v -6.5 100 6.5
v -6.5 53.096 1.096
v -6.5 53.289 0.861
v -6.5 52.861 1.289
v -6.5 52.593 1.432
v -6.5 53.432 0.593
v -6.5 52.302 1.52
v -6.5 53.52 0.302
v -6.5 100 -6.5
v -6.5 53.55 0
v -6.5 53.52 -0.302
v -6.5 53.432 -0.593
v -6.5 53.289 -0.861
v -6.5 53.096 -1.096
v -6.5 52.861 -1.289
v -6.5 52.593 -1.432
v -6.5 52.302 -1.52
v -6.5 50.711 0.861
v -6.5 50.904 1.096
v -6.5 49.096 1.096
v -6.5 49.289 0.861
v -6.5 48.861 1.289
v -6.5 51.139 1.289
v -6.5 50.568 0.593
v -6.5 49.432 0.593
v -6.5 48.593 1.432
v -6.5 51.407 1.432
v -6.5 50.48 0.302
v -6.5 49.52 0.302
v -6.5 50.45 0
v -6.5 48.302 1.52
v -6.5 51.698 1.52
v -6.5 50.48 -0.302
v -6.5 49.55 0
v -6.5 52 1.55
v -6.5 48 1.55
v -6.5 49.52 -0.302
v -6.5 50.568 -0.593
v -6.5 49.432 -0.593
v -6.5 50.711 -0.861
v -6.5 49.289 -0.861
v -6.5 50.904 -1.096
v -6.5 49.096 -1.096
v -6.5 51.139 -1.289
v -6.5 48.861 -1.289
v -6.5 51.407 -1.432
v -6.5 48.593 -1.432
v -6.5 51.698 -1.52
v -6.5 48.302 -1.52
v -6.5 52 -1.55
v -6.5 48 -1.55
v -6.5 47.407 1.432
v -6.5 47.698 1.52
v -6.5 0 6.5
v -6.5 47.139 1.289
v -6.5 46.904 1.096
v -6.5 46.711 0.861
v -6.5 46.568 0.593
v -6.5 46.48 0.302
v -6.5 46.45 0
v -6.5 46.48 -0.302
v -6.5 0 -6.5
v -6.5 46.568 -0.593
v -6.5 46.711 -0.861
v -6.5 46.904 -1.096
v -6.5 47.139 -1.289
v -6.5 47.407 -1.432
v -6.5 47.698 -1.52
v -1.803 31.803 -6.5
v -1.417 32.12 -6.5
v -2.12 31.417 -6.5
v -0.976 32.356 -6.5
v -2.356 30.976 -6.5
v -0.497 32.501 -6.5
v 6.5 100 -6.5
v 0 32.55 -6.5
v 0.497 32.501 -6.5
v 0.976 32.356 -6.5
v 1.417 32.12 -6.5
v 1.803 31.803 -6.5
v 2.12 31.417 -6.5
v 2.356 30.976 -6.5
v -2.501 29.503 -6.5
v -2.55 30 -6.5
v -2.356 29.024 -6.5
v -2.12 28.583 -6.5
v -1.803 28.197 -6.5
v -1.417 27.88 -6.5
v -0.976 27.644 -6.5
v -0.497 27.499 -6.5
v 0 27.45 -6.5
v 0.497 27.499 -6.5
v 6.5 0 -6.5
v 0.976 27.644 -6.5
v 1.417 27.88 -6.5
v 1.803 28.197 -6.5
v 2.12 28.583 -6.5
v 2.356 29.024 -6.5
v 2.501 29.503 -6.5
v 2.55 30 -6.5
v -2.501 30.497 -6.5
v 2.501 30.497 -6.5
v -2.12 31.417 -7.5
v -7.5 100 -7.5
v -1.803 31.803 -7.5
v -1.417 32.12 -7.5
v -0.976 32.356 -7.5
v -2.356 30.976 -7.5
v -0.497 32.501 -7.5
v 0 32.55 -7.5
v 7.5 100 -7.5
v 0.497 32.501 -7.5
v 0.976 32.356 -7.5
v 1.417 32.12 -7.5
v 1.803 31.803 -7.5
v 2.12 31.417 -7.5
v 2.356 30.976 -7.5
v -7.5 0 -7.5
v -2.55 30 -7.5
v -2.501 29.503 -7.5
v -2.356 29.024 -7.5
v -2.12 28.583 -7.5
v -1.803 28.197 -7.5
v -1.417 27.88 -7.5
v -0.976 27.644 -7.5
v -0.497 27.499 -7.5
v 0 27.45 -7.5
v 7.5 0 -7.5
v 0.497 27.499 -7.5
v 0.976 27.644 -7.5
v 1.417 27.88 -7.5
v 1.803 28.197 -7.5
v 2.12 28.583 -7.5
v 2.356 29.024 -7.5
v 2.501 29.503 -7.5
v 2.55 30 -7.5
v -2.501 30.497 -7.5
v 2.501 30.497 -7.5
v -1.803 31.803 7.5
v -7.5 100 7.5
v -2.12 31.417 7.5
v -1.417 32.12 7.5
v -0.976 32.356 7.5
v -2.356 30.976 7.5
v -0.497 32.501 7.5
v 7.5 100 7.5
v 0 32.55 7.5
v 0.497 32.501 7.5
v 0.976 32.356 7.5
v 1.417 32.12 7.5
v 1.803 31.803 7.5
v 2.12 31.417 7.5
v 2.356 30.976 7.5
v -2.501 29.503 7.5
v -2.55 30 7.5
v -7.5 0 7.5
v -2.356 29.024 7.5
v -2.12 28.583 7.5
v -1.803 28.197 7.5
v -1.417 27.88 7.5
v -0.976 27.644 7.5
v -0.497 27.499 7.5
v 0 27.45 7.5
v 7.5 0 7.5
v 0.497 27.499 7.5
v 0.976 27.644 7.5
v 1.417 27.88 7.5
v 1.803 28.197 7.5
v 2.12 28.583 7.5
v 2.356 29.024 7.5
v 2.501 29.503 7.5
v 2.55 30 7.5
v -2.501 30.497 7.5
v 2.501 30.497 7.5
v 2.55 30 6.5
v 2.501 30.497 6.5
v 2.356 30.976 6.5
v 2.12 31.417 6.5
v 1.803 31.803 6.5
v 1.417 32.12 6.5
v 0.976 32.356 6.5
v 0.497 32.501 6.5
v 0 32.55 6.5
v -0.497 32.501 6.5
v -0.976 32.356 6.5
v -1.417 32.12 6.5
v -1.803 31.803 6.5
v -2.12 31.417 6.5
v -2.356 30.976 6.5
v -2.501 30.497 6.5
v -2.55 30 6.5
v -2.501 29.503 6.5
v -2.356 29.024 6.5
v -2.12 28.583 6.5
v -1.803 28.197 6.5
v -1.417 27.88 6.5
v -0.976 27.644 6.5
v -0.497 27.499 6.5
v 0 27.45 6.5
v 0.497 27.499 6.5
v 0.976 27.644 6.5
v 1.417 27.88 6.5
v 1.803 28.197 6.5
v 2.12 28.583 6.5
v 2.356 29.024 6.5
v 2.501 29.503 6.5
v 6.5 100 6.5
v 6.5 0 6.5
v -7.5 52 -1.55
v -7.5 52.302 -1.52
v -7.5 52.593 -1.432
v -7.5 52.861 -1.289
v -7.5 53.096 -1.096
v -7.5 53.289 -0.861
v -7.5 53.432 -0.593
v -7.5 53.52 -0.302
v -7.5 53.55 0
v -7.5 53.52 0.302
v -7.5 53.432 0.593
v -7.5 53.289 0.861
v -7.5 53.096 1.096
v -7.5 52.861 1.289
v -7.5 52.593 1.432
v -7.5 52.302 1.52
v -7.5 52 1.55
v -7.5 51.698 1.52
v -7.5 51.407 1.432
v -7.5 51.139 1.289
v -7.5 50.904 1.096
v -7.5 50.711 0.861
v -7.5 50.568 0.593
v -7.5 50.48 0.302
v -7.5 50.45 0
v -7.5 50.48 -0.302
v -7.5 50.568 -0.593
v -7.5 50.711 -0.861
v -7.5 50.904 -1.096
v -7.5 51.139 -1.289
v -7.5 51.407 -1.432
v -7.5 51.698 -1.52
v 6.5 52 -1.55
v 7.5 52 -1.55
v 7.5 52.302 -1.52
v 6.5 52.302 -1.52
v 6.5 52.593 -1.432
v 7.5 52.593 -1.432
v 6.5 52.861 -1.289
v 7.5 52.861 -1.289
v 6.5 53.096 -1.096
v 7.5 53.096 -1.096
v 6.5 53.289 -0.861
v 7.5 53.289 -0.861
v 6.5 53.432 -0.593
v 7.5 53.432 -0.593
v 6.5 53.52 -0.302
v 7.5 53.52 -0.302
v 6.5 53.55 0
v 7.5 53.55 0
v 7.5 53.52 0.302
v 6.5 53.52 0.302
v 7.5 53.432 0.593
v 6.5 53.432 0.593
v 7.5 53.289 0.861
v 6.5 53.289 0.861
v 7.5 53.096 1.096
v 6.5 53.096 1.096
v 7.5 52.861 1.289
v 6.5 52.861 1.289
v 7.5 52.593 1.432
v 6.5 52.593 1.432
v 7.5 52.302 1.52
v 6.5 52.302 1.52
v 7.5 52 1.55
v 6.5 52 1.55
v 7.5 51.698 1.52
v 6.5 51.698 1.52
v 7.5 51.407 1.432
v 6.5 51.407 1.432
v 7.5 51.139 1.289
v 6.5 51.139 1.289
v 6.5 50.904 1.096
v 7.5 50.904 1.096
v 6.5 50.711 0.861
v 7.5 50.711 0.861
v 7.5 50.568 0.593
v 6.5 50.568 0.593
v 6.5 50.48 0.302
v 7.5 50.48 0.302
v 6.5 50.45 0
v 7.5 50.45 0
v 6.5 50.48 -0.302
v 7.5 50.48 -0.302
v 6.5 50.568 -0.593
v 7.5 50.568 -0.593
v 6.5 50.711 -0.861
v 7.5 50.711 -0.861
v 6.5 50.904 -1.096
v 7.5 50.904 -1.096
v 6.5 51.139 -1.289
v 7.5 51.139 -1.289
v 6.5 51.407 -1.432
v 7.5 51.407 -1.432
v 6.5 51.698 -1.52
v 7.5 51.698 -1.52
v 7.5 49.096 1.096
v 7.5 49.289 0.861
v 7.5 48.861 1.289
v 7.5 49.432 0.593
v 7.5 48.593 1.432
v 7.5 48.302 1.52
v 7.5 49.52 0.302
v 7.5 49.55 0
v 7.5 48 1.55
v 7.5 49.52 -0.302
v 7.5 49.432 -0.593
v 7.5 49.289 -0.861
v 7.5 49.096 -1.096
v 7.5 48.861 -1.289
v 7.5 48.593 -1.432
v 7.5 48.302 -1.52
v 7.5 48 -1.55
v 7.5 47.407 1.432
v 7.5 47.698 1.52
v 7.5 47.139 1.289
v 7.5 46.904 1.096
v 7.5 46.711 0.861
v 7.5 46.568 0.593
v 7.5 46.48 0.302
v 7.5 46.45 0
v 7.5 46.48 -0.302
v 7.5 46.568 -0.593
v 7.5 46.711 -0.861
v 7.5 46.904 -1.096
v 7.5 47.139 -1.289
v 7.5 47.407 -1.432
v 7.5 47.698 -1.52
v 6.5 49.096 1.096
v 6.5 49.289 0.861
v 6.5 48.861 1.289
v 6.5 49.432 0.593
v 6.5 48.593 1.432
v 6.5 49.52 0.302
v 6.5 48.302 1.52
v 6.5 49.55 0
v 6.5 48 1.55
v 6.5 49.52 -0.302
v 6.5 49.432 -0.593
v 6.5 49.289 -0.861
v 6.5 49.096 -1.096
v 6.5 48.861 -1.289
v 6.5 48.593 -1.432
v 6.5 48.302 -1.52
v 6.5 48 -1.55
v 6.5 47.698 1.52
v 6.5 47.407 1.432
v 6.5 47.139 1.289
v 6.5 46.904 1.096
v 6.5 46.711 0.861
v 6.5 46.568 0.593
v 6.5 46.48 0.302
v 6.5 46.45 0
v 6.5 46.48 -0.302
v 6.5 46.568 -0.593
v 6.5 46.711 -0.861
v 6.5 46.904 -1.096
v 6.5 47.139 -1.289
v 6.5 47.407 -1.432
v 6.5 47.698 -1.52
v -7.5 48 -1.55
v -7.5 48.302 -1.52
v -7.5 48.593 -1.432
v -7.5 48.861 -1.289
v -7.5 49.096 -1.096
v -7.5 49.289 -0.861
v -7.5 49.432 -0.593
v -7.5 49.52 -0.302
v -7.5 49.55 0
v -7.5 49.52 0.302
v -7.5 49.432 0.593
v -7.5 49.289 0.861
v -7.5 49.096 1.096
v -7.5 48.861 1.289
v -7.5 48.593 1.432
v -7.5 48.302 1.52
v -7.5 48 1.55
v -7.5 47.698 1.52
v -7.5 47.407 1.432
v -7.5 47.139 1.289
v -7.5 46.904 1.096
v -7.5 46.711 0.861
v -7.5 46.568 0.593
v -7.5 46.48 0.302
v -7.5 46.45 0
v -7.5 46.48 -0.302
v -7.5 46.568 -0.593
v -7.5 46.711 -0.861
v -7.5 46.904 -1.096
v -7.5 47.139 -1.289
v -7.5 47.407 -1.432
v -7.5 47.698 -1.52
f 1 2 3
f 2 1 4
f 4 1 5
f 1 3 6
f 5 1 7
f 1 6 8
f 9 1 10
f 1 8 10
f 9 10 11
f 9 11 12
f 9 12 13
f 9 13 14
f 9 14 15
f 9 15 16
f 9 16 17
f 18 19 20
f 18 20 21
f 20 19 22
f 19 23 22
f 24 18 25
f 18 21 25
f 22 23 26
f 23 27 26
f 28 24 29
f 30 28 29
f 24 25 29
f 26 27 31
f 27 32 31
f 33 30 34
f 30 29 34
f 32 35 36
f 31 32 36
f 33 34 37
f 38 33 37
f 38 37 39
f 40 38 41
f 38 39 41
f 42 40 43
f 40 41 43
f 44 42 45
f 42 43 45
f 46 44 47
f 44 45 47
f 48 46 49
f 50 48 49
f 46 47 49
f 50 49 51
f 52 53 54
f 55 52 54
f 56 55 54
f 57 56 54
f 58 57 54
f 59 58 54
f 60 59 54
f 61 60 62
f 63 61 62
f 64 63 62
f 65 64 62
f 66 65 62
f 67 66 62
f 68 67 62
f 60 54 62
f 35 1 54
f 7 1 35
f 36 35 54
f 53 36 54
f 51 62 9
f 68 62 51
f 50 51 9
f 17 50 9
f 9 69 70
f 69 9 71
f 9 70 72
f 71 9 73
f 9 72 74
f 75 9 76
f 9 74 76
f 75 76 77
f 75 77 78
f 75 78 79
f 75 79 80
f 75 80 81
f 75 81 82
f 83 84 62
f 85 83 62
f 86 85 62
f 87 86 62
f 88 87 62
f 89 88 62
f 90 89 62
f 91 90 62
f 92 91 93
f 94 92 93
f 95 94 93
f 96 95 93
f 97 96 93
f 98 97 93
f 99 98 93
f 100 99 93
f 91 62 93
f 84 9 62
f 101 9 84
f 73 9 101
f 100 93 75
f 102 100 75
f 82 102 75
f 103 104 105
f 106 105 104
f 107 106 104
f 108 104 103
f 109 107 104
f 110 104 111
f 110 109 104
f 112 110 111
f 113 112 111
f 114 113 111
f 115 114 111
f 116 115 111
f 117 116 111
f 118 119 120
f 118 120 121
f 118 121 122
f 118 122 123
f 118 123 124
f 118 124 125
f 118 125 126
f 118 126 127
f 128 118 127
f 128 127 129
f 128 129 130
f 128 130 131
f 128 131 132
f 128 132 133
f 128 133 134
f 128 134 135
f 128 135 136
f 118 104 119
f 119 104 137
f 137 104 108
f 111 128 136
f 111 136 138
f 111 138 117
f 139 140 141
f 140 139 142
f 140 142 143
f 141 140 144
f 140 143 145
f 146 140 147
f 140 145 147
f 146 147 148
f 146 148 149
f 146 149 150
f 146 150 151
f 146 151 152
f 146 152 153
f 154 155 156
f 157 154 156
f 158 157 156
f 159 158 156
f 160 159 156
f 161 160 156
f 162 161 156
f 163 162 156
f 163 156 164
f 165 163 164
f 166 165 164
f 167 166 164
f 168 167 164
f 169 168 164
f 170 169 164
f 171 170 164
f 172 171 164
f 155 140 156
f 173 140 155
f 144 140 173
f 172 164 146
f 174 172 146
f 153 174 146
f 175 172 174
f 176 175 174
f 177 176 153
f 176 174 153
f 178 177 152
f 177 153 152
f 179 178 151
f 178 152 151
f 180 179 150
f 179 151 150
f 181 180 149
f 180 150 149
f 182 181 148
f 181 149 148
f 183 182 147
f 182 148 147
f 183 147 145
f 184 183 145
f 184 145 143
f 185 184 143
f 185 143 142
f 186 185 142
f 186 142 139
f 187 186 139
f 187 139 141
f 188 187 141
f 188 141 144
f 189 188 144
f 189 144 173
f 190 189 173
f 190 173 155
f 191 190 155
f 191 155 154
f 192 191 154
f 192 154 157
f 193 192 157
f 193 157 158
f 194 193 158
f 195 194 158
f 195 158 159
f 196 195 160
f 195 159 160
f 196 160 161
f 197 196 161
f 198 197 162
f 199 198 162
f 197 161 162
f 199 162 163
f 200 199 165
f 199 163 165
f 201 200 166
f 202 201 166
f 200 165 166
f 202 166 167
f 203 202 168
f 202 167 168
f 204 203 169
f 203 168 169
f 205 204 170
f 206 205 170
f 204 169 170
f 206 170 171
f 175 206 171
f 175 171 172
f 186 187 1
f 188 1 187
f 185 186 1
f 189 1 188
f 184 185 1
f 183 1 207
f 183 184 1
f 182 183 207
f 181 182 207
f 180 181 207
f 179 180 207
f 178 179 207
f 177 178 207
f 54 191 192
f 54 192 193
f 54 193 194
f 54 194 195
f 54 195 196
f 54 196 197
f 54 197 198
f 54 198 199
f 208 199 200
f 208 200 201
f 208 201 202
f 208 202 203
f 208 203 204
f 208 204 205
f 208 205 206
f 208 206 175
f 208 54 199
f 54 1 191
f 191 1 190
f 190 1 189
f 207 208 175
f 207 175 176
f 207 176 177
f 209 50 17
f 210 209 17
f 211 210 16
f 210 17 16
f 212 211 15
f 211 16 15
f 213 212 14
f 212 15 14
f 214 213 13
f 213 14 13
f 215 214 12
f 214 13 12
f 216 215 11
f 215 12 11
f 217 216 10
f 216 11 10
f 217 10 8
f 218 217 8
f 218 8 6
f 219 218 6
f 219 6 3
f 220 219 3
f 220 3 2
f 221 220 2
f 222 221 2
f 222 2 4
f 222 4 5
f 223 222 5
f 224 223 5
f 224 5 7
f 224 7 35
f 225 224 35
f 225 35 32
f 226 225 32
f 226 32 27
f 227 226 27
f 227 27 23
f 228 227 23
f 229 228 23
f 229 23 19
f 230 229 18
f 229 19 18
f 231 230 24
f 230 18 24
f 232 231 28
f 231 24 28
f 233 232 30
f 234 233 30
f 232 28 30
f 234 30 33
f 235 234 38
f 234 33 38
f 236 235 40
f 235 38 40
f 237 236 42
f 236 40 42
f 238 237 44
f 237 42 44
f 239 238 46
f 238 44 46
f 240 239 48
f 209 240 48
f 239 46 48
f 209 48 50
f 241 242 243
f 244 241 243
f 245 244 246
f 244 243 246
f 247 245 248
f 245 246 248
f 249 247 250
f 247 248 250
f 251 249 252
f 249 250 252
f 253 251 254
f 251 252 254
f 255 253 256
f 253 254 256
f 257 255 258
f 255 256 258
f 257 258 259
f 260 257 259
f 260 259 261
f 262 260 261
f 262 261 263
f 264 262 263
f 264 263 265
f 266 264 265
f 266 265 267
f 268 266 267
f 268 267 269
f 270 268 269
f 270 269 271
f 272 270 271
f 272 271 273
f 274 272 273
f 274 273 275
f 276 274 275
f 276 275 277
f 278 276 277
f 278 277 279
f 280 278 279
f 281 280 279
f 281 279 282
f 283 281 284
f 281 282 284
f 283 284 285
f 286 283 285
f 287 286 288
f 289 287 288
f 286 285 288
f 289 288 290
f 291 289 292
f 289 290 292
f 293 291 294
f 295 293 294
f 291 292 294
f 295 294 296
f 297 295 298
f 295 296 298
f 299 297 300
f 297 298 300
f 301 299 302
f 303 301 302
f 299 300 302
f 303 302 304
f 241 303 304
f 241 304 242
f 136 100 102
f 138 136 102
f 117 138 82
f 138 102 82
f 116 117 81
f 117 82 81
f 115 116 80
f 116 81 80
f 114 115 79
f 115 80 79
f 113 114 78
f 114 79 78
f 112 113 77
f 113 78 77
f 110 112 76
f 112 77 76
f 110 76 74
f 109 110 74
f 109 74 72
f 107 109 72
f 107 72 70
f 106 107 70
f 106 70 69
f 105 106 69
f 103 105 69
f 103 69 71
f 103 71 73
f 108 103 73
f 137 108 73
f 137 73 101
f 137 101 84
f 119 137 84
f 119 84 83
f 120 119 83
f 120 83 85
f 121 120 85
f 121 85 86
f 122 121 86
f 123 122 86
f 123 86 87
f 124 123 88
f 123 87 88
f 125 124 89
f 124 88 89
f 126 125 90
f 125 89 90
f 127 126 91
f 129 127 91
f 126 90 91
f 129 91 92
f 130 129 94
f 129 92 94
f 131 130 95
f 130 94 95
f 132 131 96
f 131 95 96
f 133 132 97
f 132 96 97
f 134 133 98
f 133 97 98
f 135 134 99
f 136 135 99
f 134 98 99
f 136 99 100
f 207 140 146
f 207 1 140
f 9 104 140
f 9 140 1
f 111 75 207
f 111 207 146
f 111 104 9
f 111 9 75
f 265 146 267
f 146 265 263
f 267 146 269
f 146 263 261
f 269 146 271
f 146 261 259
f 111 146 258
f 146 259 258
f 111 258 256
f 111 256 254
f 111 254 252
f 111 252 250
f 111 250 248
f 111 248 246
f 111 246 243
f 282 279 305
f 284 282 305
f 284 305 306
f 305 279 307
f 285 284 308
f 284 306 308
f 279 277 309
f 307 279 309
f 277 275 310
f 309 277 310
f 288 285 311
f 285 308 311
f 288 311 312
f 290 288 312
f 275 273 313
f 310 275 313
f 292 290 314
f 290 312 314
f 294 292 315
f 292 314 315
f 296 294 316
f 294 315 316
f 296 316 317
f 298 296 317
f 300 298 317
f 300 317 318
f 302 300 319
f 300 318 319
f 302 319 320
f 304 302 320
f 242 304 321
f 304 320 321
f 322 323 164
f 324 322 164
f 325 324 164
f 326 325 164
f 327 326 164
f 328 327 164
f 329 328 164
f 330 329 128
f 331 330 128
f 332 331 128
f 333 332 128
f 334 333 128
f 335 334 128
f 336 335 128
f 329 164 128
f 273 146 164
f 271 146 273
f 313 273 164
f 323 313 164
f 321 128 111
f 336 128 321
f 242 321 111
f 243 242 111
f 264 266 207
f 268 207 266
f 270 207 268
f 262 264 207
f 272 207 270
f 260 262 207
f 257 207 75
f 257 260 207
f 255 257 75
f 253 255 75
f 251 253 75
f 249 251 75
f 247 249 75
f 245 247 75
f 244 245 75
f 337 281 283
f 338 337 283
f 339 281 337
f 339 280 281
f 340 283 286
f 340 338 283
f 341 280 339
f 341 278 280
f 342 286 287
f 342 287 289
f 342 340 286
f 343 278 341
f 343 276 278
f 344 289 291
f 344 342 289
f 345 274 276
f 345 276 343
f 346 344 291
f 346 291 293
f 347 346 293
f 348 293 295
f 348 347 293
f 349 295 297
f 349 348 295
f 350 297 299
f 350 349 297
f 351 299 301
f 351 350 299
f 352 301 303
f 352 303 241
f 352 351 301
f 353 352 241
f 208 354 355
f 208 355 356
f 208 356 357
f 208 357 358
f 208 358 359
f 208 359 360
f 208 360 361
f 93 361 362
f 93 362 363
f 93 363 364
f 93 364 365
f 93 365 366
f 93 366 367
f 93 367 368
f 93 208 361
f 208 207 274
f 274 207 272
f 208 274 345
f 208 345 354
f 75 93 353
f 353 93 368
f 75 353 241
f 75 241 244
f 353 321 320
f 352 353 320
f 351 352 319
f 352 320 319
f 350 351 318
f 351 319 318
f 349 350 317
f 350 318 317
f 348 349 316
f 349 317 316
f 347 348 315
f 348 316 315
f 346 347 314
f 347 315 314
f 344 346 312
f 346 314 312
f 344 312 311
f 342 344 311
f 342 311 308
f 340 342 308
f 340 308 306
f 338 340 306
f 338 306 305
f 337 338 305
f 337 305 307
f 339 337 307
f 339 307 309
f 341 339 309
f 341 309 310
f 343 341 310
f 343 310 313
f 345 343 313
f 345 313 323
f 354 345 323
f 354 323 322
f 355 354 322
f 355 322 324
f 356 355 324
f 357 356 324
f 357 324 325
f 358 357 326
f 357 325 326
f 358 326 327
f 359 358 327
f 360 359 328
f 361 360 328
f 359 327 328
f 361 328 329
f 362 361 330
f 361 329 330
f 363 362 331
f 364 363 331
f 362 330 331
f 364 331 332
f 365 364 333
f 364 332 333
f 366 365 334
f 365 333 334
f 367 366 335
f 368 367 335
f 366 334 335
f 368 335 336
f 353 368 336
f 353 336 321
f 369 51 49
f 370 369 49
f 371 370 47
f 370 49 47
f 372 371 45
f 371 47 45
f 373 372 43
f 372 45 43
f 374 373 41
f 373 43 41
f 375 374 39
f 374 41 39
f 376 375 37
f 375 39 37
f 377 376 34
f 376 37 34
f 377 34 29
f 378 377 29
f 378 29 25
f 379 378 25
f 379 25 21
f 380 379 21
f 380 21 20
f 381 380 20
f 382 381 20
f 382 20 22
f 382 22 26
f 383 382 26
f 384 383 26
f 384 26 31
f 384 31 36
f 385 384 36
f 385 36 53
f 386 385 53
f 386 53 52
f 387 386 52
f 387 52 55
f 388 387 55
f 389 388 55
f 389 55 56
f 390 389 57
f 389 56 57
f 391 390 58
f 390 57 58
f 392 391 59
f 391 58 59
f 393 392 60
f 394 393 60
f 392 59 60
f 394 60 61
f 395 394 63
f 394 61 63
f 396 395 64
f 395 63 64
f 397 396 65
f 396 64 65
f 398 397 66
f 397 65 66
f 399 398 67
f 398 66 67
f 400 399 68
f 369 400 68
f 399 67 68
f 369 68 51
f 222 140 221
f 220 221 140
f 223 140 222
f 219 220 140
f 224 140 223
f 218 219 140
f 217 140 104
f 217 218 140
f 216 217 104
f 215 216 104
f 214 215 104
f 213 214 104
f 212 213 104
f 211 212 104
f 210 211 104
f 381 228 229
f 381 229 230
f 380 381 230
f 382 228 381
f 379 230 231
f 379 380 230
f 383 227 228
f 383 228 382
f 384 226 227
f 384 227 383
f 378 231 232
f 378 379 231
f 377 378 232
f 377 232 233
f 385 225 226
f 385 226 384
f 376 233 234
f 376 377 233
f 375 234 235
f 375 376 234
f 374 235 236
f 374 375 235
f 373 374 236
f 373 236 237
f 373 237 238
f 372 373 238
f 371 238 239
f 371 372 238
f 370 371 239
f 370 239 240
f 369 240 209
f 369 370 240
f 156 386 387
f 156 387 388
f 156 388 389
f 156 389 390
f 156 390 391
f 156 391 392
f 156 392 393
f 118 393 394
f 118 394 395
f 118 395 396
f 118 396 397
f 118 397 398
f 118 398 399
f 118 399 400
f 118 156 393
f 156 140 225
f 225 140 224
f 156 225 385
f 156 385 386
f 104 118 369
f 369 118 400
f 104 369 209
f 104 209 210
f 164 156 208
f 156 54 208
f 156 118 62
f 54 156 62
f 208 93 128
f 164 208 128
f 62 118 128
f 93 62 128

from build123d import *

# Parameters (mm, degrees)
SKETCH_1_W          = 15
SKETCH_1_H          = 15
SKETCH_1_W_2        = 13
SKETCH_1_H_2        = 13
EXTRUDE_1_DEPTH     = 100
SKETCH_2_R          = 2.55
CUT_EXTRUDE_1_DEPTH = 100
SKETCH_4_R          = 1.55
CUT_EXTRUDE_2_DEPTH = 15


with BuildPart() as part:
    # 草图1 → 凸台-拉伸1 (new body)
    with BuildSketch(Plane(origin=(0, 0, 0), x_dir=(1, 0, 0), z_dir=(0, 1, 0))):
        Rectangle(SKETCH_1_W, SKETCH_1_H)
        Rectangle(SKETCH_1_W_2, SKETCH_1_H_2, mode=Mode.SUBTRACT)
    extrude(amount=EXTRUDE_1_DEPTH)

    # 草图2 → 切除-拉伸1 (cut)
    with BuildSketch(Plane.XY.offset(7.5)):
        with Locations((0, 30)):
            Circle(SKETCH_2_R)
    extrude(amount=-CUT_EXTRUDE_1_DEPTH, mode=Mode.SUBTRACT)

    # 草图4 → 切除-拉伸2 (cut)
    with BuildSketch(Plane(origin=(7.5, 0, 0), x_dir=(0, 0, -1), z_dir=(1, 0, 0))):
        with Locations((0, 52)):
            Circle(SKETCH_4_R)
        with Locations((0, 48)):
            Circle(SKETCH_4_R)
    extrude(amount=-CUT_EXTRUDE_2_DEPTH, mode=Mode.SUBTRACT)


solid = part.part
